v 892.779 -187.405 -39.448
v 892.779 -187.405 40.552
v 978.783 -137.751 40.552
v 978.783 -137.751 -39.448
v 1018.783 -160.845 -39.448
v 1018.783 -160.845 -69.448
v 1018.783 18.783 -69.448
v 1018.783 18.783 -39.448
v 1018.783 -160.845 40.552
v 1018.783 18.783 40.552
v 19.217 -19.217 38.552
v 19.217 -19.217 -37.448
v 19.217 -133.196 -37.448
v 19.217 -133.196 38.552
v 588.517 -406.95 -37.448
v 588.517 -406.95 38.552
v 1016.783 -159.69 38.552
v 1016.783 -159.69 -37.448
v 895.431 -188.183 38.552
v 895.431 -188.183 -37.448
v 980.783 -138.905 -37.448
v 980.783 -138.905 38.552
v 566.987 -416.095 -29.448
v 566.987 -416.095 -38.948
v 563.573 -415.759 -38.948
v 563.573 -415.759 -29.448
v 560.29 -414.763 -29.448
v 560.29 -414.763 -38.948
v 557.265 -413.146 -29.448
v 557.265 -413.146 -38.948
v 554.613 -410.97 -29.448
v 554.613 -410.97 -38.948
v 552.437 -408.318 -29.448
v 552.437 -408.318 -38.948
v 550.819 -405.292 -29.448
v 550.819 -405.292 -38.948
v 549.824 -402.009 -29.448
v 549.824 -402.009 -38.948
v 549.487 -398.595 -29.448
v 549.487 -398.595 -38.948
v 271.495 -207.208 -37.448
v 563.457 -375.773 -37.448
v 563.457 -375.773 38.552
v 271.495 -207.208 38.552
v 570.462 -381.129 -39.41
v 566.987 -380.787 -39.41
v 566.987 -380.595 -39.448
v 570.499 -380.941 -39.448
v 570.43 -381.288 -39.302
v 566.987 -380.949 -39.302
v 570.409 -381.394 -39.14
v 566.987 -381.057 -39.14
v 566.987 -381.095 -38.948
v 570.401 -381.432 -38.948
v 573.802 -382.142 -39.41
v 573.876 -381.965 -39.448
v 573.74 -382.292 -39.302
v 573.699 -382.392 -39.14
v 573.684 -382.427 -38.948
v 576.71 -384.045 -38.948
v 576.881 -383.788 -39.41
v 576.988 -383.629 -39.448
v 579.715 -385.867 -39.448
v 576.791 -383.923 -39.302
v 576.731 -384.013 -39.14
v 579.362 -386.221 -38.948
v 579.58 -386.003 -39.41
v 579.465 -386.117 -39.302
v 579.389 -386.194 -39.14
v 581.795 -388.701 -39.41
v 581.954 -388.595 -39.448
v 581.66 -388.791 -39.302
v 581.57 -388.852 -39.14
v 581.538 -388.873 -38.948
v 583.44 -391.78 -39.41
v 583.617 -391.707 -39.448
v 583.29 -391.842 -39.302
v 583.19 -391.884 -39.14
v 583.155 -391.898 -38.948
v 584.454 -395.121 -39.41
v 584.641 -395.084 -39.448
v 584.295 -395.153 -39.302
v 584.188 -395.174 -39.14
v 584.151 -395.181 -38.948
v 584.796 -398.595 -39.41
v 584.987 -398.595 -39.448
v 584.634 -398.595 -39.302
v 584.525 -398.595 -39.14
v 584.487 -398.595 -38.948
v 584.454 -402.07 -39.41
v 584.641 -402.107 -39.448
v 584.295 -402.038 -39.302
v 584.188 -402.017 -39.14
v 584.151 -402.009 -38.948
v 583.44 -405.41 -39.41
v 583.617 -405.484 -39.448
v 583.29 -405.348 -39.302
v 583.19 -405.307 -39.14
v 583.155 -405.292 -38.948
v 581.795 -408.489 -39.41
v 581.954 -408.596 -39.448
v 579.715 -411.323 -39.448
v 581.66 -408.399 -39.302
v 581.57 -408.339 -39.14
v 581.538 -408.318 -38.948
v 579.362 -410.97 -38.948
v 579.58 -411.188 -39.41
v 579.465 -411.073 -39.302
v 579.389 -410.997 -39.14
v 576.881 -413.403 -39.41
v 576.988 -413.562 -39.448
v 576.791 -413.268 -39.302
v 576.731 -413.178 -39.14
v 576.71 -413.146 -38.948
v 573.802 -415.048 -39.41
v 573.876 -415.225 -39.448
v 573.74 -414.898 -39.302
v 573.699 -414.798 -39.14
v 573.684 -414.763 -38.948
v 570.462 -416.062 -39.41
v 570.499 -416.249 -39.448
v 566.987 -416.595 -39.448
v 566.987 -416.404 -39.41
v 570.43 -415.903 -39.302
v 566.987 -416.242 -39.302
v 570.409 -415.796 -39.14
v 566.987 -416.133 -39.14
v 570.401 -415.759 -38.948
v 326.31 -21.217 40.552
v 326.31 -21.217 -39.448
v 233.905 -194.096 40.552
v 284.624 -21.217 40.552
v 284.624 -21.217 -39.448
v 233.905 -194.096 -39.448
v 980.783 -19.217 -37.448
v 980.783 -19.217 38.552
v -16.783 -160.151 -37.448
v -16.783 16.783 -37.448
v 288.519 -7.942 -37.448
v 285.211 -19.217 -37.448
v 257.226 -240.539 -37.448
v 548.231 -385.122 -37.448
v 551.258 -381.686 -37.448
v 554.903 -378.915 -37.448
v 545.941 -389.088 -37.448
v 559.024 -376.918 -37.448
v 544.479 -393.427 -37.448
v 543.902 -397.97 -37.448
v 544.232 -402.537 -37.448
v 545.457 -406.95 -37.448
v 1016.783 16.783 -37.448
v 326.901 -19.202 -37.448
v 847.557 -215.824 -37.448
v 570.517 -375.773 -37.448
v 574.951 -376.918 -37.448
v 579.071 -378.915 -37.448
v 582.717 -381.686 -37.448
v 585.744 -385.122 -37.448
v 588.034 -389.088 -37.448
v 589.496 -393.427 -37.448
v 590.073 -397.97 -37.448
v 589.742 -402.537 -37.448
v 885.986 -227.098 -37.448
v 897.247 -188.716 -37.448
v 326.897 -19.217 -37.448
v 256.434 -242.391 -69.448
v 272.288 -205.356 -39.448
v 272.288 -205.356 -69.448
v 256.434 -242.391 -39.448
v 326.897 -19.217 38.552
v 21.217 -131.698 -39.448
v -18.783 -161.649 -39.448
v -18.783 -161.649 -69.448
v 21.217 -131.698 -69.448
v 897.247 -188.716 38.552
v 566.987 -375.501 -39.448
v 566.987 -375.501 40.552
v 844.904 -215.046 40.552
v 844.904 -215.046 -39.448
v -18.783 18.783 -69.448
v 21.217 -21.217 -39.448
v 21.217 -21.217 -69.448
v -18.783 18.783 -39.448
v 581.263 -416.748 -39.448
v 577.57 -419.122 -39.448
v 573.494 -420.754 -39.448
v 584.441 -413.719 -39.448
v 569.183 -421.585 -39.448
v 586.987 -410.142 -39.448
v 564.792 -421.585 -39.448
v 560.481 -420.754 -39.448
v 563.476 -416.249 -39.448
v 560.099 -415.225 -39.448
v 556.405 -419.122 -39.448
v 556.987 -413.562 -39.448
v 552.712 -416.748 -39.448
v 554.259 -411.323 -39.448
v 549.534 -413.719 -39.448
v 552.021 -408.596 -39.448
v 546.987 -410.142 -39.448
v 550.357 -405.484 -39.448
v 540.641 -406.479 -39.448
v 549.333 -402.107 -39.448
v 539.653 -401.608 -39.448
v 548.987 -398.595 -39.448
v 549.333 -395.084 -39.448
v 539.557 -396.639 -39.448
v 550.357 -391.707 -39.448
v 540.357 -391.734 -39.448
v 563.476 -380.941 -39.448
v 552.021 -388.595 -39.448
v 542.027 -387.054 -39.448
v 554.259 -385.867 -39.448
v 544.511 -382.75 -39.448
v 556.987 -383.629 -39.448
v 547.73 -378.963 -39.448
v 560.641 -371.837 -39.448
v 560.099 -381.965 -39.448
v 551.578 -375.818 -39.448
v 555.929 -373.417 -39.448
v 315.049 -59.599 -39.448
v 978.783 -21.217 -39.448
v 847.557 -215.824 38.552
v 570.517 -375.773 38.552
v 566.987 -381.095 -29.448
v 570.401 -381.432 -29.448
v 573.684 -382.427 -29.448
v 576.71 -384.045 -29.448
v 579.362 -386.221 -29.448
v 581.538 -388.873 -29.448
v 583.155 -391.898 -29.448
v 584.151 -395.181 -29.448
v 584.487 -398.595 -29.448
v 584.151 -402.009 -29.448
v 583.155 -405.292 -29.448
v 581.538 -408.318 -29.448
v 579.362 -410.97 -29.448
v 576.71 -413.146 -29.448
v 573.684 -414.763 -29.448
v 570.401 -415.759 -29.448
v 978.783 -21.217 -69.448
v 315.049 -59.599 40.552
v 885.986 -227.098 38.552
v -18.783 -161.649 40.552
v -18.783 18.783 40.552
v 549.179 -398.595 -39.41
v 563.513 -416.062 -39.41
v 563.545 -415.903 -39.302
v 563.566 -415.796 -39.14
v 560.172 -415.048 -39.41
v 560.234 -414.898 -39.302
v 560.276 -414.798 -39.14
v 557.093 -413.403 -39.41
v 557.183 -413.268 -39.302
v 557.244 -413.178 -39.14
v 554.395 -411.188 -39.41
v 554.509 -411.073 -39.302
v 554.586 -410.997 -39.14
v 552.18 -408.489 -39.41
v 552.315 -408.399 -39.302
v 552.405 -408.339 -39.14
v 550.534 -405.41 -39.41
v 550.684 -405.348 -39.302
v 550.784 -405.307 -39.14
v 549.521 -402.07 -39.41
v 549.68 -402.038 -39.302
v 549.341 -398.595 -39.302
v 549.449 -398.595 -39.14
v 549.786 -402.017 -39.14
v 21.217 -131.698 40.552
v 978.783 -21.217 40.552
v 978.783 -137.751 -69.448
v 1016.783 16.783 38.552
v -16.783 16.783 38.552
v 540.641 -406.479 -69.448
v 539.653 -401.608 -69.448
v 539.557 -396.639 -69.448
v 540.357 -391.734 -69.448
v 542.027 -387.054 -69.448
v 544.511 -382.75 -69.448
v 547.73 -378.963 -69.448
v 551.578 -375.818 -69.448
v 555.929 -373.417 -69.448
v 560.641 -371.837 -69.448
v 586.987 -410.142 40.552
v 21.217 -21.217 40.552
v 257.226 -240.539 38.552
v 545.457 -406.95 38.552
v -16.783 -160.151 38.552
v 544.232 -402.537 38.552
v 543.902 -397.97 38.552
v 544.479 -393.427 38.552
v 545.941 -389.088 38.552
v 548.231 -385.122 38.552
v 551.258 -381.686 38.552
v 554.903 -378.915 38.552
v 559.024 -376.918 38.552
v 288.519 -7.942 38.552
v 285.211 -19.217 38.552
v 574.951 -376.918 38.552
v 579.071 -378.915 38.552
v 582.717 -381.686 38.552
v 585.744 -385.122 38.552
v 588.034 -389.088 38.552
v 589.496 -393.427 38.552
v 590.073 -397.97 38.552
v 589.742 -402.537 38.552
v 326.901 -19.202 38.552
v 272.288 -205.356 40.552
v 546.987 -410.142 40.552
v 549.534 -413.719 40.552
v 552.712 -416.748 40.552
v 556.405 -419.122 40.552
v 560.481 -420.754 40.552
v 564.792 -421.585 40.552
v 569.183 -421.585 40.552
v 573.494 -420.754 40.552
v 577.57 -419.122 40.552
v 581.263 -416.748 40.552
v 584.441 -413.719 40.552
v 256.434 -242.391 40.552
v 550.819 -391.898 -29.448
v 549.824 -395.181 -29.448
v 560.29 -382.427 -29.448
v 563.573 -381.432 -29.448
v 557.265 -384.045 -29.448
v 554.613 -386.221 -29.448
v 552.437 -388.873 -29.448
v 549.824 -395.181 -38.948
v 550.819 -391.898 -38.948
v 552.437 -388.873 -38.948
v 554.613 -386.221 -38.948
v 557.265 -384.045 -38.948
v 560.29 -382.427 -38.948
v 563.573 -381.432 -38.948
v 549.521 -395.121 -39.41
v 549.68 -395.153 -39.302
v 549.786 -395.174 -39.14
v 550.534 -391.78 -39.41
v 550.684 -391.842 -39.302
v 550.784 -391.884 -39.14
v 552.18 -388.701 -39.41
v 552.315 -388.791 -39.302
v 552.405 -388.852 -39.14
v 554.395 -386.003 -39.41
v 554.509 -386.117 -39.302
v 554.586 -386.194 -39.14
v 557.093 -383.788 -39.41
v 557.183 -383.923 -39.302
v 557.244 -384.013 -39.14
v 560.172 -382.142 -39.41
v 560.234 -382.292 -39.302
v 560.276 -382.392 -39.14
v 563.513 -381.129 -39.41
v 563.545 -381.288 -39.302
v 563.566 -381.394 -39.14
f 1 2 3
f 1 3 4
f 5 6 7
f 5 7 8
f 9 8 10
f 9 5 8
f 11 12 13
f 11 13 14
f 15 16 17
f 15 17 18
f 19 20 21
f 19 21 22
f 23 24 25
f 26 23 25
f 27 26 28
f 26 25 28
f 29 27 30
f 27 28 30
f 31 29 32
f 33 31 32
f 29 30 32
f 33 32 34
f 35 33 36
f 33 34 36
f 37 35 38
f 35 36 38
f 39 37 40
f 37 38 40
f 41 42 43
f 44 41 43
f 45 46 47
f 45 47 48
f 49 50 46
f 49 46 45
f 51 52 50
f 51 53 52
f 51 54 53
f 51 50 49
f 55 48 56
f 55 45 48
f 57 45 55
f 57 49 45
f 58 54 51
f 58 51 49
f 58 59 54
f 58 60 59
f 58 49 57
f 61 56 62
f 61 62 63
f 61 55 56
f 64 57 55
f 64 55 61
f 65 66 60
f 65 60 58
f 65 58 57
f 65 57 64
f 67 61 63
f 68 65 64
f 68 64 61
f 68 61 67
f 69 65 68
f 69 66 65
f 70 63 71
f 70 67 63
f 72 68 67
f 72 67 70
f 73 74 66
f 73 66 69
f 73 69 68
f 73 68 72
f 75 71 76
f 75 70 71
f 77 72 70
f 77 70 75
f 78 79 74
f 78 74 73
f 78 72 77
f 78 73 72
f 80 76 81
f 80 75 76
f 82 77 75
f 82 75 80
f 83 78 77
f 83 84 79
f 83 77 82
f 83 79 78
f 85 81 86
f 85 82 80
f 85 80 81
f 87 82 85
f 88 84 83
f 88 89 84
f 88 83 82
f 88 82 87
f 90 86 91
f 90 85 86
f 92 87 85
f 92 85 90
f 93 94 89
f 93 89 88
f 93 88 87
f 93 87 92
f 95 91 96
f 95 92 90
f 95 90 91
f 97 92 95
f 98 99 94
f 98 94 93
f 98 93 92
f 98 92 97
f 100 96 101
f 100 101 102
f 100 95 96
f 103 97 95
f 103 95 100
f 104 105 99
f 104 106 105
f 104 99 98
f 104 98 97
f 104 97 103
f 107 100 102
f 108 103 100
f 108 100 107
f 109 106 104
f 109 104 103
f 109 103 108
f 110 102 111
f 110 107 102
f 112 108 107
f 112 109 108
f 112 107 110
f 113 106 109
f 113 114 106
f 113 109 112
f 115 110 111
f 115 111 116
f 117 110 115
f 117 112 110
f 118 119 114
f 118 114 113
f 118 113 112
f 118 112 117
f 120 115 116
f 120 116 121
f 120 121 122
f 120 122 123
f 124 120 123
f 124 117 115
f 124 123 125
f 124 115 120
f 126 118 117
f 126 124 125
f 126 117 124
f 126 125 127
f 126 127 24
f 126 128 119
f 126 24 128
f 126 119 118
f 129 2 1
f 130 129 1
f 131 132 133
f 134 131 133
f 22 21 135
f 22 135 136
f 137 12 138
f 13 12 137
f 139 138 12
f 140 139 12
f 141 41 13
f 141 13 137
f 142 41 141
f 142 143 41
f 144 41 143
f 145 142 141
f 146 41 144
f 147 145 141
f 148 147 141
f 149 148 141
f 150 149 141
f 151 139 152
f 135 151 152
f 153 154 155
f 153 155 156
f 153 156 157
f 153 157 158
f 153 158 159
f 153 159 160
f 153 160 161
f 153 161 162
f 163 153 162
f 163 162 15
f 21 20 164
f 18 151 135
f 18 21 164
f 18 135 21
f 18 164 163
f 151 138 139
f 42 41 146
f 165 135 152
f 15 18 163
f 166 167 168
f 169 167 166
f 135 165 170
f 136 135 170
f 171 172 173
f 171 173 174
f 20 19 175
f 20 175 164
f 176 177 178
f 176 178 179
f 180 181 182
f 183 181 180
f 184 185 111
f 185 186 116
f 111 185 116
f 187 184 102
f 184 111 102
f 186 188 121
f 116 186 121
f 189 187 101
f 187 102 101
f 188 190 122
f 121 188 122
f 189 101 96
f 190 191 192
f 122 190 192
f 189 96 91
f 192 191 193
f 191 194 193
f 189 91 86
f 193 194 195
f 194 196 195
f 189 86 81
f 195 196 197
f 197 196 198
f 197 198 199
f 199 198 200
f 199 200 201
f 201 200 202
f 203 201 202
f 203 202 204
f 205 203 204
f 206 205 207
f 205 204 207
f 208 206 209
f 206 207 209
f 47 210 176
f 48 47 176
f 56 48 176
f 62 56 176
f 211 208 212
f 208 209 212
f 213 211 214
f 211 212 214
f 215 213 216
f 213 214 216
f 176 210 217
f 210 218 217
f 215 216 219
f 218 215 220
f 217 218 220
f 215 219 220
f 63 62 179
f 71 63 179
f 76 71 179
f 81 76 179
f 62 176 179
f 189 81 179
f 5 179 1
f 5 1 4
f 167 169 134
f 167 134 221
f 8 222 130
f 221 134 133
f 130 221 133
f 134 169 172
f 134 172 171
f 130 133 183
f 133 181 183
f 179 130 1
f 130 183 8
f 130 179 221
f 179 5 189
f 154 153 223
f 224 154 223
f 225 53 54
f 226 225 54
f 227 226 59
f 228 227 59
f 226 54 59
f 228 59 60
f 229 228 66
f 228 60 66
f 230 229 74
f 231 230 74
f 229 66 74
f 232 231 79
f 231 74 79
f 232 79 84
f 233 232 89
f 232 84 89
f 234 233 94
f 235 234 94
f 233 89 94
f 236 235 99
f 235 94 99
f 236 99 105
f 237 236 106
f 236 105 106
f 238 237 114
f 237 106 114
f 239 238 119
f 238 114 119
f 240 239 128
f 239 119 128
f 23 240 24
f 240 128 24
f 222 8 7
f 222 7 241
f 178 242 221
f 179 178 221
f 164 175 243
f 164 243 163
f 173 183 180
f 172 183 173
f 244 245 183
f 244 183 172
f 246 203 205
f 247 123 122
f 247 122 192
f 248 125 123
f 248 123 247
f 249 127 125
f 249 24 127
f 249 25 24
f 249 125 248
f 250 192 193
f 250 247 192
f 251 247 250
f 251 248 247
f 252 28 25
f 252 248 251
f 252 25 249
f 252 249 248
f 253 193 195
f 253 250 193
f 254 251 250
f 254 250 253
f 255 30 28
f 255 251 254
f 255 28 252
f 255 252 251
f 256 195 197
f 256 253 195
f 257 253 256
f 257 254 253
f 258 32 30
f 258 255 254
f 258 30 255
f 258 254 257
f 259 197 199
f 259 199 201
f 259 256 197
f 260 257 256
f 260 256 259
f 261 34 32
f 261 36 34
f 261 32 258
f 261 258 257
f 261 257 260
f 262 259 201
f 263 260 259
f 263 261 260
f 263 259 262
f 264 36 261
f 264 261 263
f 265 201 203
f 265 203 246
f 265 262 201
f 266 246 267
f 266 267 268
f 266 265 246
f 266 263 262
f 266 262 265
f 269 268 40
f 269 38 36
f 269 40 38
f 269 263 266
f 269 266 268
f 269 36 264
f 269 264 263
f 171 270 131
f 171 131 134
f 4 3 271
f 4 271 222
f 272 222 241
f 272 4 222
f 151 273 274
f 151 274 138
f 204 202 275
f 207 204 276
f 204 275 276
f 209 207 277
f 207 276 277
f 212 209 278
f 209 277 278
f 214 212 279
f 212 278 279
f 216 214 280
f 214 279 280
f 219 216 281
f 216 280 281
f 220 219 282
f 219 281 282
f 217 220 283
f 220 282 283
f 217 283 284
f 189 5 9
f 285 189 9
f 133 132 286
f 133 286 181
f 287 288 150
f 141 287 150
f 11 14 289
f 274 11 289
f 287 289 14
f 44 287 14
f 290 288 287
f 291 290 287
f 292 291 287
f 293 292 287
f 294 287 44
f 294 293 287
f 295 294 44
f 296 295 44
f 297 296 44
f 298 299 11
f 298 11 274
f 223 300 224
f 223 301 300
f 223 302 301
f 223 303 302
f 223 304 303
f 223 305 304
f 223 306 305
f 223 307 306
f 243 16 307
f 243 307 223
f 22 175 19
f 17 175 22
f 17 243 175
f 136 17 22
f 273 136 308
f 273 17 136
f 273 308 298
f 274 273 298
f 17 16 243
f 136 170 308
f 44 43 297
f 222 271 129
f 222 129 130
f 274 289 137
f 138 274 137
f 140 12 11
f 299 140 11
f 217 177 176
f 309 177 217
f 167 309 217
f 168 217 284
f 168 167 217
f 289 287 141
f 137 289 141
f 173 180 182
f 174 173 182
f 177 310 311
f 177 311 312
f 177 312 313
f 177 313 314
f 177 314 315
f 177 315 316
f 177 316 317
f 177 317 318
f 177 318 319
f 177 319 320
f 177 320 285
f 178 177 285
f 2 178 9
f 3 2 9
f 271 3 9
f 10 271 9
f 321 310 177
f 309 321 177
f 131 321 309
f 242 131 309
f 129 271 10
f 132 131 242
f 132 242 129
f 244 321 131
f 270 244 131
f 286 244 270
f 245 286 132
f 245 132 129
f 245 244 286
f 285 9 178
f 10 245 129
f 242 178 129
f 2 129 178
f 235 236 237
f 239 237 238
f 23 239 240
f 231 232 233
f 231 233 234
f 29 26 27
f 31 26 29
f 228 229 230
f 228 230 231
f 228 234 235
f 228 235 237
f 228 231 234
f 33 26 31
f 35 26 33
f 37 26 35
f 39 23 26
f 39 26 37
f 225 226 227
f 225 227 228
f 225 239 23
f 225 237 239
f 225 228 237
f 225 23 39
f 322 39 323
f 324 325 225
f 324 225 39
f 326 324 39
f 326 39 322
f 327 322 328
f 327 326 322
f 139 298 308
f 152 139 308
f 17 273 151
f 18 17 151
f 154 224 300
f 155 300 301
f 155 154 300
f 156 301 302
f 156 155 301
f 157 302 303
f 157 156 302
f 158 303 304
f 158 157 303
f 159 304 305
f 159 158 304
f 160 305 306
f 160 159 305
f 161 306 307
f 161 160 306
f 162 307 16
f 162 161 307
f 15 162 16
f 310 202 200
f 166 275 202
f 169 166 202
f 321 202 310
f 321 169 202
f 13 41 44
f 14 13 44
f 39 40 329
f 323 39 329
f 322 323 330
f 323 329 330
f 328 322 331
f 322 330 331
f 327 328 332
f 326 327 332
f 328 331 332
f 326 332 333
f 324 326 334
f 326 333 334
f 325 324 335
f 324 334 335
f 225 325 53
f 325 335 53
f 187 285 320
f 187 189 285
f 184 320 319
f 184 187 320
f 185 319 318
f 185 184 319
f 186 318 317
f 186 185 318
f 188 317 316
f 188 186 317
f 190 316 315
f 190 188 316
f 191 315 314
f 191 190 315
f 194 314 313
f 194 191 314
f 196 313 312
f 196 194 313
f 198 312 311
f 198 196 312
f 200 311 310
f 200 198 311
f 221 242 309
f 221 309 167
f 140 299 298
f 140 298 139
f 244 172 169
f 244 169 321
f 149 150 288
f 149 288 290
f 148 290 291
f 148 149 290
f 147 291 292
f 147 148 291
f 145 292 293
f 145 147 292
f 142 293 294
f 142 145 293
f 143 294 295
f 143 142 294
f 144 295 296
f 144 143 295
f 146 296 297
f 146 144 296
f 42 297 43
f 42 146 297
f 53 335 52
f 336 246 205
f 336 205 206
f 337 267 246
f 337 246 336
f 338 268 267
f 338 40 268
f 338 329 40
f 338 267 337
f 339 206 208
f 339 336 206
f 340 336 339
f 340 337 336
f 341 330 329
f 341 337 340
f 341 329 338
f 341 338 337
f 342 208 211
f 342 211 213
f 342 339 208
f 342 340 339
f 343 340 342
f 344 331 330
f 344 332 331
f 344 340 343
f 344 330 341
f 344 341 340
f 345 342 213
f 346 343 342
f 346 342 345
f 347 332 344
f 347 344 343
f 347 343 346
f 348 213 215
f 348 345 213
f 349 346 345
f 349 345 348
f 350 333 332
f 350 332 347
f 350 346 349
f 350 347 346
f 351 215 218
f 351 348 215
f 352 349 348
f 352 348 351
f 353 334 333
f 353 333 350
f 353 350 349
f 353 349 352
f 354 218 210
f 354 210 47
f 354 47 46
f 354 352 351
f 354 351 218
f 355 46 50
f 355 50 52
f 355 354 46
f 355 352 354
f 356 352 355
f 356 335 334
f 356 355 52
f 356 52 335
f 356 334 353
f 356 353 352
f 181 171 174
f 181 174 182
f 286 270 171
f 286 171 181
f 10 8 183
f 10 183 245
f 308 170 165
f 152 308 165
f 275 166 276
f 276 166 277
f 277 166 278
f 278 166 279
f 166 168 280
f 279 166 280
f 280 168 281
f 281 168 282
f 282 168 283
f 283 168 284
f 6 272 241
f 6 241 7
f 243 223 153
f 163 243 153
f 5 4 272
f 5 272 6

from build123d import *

# Parameters (mm, degrees)
SKETCH_6_W          = 80
SKETCH_6_H          = 40
SKETCH_6_W_2        = 76
SKETCH_6_H_2        = 36
SKETCH_14_W         = 40
SKETCH_14_H         = 80
EXTRUDE_1_DEPTH     = 194
SKETCH_15_W         = 80
SKETCH_15_H         = 40
EXTRUDE_2_DEPTH     = 595
EXTRUDE_3_DEPTH     = 30
SKETCH_17_R         = 23.094010768
EXTRUDE_4_DEPTH     = 110
SKETCH_18_R         = 27.5
SKETCH_18_R_2       = 23.094010768
CUT_EXTRUDE_1_DEPTH = 30
SKETCH_22_R         = 23.094010768
CUT_EXTRUDE_3_DEPTH = 30
CUT_EXTRUDE_4_DEPTH = 10
FILLET_1_R          = 0.5


with BuildPart() as part:
    # По траектории13: sweep along a curve in space
    with BuildLine() as sweep_13_path:
        Line((0, 0, 0), (1000, 0, 0))
        Line((1000, 0, 0), (1000, -150, 0))
        Line((1000, -150, 0), (566.987298108, -400, 0))
        Line((566.987298108, -400, 0), (263.878406783, -225, 0))
        Line((263.878406783, -225, 0), (0, -147.584326952, 0))
        Line((0, -147.584326952, 0), (0, 0, 0))
    # Эскиз6 → По траектории13 (sweep)
    with BuildSketch(Plane(origin=(0, 0, 0), x_dir=(0, 0, -1), z_dir=(1, 0, 0))):
        with Locations((-0.551773823, -1.216505436)):
            Rectangle(SKETCH_6_W, SKETCH_6_H)
        with Locations((-0.551773823, -1.216505436)):
            Rectangle(SKETCH_6_W_2, SKETCH_6_H_2, mode=Mode.SUBTRACT)
    sweep(path=sweep_13_path.line, transition=Transition.RIGHT)

    # Эскиз14 → Бобышка-Вытянуть1 (add)
    with BuildSketch(Plane(origin=(-33.89376203, -115.529989888, 0), x_dir=(0.9595578428480989, -0.2815115383580276, 0), z_dir=(0.2815115383580276, 0.9595578428480989, 0))):
        with Locations((299.085913187, -0.551773823)):
            Rectangle(SKETCH_14_W, SKETCH_14_H)
    extrude(amount=EXTRUDE_1_DEPTH)

    # Эскиз15 → Бобышка-Вытянуть2 (add)
    with BuildSketch(Plane(origin=(306.181390541, -89.82636629, 0), x_dir=(0, 0, -1), z_dir=(0.9595578428480989, -0.28151153835802767, 0))):
        with Locations((-0.551773823, 51.50143726)):
            Rectangle(SKETCH_15_W, SKETCH_15_H)
    extrude(amount=EXTRUDE_2_DEPTH)

    # Эскиз16 → Бобышка-Вытянуть3 (add)
    with BuildSketch(Plane(origin=(0, 0, -39.448226177), x_dir=(-1, 0, 0), z_dir=(0, 0, -1))):
        Polygon((18.783494564, 18.783494564), (18.783494564, -161.648850746), (-21.216505436, -131.698036755), (-21.216505436, -21.216505436), align=None)
        Polygon((-272.28762851, -205.356356178), (-256.433515773, -242.391001456), (-566.987298108, -421.689311285), (-566.987298108, -375.50128975), align=None)
        Polygon((-1018.783494564, 18.783494564), (-978.783494564, -21.216505436), (-978.783494564, -137.750644875), (-1018.783494564, -160.844655643), align=None)
    extrude(amount=EXTRUDE_3_DEPTH)

    # Эскиз17 → Бобышка-Вытянуть4 (add)
    with BuildSketch(Plane(origin=(0, 0, -69.448226177), x_dir=(-1, 0, 0), z_dir=(0, 0, -1))):
        with Locations((-566.987298108, -398.595300518)):
            Circle(SKETCH_17_R)
    extrude(amount=-EXTRUDE_4_DEPTH)

    # Эскиз18 → Вырез-Вытянуть1 (cut)
    with BuildSketch(Plane(origin=(0, 0, -69.448226177), x_dir=(-1, 0, 0), z_dir=(0, 0, -1))):
        with Locations((-566.987298108, -398.595300518)):
            Circle(SKETCH_18_R)
        with Locations((-566.987298108, -398.595300518)):
            Circle(SKETCH_18_R_2, mode=Mode.SUBTRACT)
    extrude(amount=-CUT_EXTRUDE_1_DEPTH, mode=Mode.SUBTRACT)

    # Эскиз22 → Вырез-Вытянуть3 (cut)
    with BuildSketch(Plane(origin=(0, 0, -69.448226177), x_dir=(-1, 0, 0), z_dir=(0, 0, -1))):
        with Locations((-566.987298108, -398.595300518)):
            Circle(SKETCH_22_R)
    extrude(amount=-CUT_EXTRUDE_3_DEPTH, mode=Mode.SUBTRACT)

    # Эскиз23 → Вырез-Вытянуть4 (cut)
    with BuildSketch(Plane(origin=(0, 0, -39.448226177), x_dir=(-1, 0, 0), z_dir=(0, 0, -1))):
        with BuildLine():
            ThreePointArc((-549.487298108, -398.595300518), (-554.612929437, -386.220931847), (-566.987298108, -381.095300518))
            Line((-566.987298108, -381.095300518), (-566.987298108, -416.095300518))
            ThreePointArc((-566.987298108, -416.095300518), (-554.612929437, -410.969669189), (-549.487298108, -398.595300518))
        make_face()
        with BuildLine():
            Line((-566.987298108, -416.095300518), (-566.987298108, -381.095300518))
            ThreePointArc((-566.987298108, -381.095300518), (-584.487298108, -398.595300518), (-566.987298108, -416.095300518))
        make_face()
    extrude(amount=-CUT_EXTRUDE_4_DEPTH, mode=Mode.SUBTRACT)

    # Скругление1
    fillet_1_edges = [part.edges().sort_by_distance(p)[0] for p in [
        (566.987298108, -416.095300518, -39.448226177),
    ]]
    fillet(fillet_1_edges, radius=FILLET_1_R)


solid = part.part
